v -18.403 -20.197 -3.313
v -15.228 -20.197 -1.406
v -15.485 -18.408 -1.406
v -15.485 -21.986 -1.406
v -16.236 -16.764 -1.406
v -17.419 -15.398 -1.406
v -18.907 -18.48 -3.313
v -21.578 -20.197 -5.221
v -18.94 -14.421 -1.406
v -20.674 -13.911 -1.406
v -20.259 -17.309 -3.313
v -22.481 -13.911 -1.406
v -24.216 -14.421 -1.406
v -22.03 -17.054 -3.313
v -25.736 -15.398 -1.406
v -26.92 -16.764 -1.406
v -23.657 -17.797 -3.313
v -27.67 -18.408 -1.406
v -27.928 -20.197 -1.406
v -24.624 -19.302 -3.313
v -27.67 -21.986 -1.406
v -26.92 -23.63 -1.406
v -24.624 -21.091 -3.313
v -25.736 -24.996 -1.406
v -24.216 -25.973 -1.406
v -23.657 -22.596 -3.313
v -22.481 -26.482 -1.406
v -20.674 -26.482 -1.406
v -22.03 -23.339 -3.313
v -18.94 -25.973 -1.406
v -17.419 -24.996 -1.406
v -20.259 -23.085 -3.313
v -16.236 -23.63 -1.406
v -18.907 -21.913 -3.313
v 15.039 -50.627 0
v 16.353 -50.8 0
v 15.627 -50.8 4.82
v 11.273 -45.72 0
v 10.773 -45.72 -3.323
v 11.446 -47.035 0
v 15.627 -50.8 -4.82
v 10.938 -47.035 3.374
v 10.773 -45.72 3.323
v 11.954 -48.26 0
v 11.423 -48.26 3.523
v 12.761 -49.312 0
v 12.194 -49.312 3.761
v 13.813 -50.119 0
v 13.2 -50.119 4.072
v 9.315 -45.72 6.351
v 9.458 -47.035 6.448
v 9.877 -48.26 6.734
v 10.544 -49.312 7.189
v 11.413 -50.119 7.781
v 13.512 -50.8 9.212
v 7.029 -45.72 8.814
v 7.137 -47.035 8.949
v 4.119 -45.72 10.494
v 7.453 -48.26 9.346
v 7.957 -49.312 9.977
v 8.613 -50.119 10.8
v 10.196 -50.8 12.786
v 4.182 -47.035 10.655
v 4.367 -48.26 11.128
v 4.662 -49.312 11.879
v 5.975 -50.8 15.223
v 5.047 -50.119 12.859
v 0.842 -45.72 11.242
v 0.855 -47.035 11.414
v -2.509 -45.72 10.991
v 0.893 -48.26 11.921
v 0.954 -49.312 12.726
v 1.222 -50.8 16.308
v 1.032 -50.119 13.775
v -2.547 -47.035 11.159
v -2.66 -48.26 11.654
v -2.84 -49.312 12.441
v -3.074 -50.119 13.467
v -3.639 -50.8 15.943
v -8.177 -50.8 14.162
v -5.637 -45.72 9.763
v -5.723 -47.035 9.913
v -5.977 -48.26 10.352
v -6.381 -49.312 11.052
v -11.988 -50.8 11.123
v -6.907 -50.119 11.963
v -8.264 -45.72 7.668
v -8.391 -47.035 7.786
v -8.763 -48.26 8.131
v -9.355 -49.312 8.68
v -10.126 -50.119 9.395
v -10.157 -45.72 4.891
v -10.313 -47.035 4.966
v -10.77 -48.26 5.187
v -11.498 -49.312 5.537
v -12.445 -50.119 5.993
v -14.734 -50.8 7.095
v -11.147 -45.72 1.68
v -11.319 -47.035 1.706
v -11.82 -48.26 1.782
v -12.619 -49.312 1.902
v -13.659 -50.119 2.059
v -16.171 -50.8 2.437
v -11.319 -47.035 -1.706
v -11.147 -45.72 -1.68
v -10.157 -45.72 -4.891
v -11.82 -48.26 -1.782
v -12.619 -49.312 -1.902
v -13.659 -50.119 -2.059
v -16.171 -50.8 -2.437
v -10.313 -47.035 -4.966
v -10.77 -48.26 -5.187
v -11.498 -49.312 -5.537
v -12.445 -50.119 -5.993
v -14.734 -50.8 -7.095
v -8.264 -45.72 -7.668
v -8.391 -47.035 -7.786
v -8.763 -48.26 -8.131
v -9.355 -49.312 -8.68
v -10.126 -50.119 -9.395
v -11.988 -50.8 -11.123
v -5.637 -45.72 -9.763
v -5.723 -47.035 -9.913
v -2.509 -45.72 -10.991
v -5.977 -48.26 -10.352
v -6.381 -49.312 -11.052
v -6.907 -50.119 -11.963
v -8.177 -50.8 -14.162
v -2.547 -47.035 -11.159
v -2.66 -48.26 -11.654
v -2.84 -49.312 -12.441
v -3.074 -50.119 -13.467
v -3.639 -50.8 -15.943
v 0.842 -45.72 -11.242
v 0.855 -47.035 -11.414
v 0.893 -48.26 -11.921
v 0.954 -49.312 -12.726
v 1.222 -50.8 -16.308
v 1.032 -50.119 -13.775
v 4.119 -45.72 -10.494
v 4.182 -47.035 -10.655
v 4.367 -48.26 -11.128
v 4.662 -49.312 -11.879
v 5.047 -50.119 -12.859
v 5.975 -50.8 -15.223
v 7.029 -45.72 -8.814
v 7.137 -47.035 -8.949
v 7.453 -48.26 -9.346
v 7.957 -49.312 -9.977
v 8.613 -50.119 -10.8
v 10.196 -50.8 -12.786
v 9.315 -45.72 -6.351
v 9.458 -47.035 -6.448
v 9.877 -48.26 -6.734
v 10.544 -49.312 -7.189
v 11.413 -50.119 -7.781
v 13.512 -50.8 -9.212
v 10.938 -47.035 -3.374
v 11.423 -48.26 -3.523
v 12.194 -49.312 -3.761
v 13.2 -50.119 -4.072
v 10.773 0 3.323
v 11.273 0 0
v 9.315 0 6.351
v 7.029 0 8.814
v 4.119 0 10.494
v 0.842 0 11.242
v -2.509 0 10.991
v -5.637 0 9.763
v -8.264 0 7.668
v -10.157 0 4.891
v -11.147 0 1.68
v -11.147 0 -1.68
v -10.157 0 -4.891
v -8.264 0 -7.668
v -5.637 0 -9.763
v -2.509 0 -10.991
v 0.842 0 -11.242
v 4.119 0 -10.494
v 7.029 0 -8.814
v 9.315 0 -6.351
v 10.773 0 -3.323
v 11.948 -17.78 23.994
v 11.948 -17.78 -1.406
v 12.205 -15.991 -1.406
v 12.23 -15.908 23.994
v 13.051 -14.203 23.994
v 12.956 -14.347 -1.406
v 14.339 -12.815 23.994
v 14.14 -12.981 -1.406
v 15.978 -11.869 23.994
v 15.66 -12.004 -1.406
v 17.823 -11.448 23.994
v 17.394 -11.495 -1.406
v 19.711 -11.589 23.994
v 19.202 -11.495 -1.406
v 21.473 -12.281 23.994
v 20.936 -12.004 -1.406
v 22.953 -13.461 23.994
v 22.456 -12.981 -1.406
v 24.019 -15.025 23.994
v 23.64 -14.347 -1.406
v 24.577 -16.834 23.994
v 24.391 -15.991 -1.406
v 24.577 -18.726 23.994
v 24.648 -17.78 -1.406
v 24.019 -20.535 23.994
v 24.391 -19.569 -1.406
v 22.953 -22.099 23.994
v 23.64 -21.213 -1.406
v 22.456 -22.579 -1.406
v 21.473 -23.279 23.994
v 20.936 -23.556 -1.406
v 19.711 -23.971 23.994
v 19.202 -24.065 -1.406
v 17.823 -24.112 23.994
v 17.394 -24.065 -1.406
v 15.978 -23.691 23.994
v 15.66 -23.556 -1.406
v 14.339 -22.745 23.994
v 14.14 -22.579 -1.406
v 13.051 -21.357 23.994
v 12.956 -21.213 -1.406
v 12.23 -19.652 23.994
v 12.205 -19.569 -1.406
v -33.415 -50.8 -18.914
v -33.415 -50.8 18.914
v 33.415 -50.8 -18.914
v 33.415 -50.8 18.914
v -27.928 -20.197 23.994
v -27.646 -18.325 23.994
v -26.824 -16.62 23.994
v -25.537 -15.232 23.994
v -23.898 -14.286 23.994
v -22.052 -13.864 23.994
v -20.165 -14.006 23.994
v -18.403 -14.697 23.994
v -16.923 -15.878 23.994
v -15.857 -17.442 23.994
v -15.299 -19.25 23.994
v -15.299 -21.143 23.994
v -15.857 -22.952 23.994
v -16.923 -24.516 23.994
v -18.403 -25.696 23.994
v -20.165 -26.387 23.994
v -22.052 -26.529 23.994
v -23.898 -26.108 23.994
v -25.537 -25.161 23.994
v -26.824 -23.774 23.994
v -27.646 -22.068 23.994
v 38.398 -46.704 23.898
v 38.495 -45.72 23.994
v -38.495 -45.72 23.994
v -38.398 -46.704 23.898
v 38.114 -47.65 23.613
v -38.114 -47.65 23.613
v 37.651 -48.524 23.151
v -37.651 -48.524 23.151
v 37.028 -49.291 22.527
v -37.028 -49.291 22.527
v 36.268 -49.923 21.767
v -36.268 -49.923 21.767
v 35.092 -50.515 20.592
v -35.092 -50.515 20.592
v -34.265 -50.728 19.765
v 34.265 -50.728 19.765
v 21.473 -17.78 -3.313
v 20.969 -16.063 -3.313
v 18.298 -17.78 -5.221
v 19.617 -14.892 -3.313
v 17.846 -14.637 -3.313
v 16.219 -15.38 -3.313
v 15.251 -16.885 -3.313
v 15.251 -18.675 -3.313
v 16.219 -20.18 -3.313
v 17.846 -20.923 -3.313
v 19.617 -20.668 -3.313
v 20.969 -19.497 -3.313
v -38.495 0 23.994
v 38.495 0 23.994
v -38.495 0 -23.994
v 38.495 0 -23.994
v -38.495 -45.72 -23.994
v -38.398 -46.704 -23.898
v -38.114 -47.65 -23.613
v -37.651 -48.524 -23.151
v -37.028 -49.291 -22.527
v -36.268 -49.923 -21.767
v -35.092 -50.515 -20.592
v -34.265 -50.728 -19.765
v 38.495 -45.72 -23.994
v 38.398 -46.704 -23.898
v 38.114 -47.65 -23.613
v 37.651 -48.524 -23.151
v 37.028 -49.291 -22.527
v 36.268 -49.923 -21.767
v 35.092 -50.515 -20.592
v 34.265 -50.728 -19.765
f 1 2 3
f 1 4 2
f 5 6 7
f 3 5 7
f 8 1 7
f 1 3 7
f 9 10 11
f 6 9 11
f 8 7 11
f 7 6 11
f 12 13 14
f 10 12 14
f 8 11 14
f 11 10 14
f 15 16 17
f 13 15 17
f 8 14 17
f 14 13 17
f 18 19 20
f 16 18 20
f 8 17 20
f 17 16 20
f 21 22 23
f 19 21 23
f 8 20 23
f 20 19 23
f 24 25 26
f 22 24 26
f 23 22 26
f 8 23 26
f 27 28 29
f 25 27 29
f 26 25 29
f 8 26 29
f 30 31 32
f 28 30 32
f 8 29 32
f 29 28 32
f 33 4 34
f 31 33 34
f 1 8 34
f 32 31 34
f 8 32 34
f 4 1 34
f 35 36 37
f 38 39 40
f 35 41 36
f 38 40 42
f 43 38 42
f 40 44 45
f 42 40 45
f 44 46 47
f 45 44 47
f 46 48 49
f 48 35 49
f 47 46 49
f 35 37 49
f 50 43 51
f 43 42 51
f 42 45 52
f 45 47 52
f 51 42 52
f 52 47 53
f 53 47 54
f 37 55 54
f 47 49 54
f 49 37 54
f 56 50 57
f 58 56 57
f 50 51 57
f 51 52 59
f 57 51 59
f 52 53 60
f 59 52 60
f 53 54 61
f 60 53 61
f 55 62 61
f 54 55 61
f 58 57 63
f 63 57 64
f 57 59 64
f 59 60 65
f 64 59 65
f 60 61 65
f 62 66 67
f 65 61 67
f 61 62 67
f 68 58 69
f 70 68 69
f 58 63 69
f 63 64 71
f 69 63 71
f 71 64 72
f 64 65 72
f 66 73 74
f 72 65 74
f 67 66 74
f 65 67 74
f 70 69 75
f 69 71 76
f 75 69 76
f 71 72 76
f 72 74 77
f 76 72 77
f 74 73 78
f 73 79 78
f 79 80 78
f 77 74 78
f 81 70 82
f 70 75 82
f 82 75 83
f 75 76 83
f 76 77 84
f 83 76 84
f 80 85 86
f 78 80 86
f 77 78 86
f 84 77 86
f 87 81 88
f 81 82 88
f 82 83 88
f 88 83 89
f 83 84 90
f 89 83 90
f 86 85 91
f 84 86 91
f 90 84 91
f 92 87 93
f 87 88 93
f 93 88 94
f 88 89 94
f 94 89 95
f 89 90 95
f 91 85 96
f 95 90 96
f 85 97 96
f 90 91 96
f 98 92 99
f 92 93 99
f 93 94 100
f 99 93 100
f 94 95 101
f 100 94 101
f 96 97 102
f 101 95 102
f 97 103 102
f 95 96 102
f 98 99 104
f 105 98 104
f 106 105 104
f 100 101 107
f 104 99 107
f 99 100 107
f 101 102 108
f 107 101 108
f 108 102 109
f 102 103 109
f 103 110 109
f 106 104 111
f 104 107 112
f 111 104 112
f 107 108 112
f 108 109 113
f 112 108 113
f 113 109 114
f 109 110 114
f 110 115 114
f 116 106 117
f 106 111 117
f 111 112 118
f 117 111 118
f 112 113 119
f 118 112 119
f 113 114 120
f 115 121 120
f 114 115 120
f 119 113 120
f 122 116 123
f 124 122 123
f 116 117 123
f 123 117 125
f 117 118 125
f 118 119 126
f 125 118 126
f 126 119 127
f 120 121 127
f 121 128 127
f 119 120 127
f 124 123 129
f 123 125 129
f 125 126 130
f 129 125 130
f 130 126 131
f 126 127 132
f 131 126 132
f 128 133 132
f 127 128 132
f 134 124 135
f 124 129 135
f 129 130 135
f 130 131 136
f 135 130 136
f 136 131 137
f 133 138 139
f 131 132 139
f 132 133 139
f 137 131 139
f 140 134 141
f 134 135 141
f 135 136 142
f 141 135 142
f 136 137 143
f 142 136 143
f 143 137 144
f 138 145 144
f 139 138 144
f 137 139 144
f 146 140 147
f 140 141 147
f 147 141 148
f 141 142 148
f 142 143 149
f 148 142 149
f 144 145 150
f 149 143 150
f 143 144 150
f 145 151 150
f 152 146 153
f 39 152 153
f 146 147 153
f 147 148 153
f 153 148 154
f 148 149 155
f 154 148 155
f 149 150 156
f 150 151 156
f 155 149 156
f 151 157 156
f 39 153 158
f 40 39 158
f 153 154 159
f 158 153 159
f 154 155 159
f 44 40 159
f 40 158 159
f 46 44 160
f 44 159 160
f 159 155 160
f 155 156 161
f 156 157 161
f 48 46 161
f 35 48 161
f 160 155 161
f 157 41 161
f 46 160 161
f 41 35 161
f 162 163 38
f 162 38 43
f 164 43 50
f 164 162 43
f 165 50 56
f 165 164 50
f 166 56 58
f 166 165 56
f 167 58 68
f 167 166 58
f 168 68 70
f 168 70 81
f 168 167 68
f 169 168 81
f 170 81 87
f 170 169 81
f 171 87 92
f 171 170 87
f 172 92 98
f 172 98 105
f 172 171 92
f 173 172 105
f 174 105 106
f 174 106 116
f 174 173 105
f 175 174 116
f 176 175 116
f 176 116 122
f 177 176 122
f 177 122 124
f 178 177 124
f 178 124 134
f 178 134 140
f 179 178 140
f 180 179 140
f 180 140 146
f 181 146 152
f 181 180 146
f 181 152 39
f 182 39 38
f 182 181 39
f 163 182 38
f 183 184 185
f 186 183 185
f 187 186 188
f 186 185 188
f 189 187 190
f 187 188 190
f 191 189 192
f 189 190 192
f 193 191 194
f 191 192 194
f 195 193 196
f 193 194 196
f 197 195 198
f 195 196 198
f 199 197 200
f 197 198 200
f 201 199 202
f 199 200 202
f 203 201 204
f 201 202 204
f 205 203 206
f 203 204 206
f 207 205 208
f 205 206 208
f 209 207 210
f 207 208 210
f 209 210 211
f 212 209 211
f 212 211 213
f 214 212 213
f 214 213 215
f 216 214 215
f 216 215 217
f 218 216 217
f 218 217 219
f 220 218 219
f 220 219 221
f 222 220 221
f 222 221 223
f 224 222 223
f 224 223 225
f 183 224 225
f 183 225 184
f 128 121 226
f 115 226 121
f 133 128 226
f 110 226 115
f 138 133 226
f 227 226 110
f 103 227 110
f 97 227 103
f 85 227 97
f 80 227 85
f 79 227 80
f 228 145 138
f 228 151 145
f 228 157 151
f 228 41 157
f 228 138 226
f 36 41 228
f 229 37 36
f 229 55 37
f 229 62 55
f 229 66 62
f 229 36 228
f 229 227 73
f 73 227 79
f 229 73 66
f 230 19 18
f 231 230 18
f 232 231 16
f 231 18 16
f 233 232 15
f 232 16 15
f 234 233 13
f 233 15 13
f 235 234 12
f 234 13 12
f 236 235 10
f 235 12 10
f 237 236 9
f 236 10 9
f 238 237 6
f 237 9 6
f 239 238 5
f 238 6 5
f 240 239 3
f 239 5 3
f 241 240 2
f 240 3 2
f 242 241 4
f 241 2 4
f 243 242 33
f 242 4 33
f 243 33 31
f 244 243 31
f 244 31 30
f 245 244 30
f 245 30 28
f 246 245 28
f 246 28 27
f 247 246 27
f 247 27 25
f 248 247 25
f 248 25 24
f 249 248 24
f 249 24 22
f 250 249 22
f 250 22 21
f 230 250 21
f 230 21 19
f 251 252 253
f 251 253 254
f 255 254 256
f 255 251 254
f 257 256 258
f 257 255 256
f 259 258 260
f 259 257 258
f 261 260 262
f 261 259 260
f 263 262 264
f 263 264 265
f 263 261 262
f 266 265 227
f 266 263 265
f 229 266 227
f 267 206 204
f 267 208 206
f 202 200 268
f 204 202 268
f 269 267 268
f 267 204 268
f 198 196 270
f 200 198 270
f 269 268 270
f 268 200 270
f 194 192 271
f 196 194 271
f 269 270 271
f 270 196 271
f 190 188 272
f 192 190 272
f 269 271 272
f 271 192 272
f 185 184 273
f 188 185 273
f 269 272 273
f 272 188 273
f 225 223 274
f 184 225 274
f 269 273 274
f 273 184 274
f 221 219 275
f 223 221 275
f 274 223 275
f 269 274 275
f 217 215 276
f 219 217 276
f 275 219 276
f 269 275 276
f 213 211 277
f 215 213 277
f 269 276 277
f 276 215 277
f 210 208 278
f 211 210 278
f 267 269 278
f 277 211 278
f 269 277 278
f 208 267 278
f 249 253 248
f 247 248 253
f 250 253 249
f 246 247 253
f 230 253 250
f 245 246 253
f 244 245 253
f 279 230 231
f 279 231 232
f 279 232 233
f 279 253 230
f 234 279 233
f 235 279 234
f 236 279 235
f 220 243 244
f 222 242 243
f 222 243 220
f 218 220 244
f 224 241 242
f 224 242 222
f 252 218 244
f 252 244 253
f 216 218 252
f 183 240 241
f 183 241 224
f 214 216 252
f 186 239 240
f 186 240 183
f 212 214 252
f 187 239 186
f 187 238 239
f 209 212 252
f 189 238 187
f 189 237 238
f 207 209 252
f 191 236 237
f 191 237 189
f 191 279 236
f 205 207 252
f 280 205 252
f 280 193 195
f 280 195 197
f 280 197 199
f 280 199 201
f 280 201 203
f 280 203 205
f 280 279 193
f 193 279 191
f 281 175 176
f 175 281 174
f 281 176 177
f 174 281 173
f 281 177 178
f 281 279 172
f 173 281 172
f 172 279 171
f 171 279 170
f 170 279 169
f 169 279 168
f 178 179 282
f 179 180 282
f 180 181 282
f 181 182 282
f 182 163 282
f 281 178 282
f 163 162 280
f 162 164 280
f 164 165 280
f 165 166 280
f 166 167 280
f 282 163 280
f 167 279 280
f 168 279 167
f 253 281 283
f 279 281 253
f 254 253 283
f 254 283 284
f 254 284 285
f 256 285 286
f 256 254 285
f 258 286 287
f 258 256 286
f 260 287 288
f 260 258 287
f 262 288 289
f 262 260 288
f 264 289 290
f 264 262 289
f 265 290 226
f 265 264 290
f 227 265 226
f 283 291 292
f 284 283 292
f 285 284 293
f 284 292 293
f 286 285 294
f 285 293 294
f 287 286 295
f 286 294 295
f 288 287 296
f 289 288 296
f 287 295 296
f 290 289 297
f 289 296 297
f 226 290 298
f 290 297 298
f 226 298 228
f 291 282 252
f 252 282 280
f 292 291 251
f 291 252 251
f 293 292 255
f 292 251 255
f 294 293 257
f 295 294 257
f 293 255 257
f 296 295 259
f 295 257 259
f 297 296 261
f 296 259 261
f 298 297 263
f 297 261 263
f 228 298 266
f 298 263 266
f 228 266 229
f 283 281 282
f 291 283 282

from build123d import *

# Parameters (mm, degrees)
F0_W           = 76.9891291857
F0_H           = 47.9887388647
F0_R           = 11.2733779571
F1_DEPTH       = 50.8
F2_R           = 5.08
F4_D           = 12.7
F4_DEPTH       = 25.4
F4_CBORE_D     = 12.7
F4_CBORE_DEPTH = 6.35
F4_TIP         = 3.8154649308


with BuildPart() as f1:
    # F0 (on Front) → F1 (new body)
    with BuildSketch(Plane.XZ):
        Rectangle(F0_W, F0_H)
        Circle(F0_R, mode=Mode.SUBTRACT)
    extrude(amount=F1_DEPTH)

    # F2
    f2_edges = [f1.edges().sort_by_distance(p)[0] for p in [
        (38.494565, -50.8, 0),
        (-38.494565, -50.8, 0),
        (0, -50.8, 23.994369),
        (0, -50.8, -23.994369),
        (-11.273378, -50.8, 0),
    ]]
    fillet(f2_edges, radius=F2_R)

    # F4
    with Locations(Plane.XY.offset(23.9943694323)):
        with Locations((-21.5776711702, -20.1967004687), (18.2978659868, -17.7800003439)):
            CounterBoreHole(F4_D / 2, F4_CBORE_D / 2, F4_CBORE_DEPTH, depth=F4_DEPTH)
            with Locations((0, 0, -(F4_DEPTH + F4_TIP / 2))):  # 118° drill point
                Cone(0, F4_D / 2, F4_TIP, mode=Mode.SUBTRACT)


solid = f1.part
